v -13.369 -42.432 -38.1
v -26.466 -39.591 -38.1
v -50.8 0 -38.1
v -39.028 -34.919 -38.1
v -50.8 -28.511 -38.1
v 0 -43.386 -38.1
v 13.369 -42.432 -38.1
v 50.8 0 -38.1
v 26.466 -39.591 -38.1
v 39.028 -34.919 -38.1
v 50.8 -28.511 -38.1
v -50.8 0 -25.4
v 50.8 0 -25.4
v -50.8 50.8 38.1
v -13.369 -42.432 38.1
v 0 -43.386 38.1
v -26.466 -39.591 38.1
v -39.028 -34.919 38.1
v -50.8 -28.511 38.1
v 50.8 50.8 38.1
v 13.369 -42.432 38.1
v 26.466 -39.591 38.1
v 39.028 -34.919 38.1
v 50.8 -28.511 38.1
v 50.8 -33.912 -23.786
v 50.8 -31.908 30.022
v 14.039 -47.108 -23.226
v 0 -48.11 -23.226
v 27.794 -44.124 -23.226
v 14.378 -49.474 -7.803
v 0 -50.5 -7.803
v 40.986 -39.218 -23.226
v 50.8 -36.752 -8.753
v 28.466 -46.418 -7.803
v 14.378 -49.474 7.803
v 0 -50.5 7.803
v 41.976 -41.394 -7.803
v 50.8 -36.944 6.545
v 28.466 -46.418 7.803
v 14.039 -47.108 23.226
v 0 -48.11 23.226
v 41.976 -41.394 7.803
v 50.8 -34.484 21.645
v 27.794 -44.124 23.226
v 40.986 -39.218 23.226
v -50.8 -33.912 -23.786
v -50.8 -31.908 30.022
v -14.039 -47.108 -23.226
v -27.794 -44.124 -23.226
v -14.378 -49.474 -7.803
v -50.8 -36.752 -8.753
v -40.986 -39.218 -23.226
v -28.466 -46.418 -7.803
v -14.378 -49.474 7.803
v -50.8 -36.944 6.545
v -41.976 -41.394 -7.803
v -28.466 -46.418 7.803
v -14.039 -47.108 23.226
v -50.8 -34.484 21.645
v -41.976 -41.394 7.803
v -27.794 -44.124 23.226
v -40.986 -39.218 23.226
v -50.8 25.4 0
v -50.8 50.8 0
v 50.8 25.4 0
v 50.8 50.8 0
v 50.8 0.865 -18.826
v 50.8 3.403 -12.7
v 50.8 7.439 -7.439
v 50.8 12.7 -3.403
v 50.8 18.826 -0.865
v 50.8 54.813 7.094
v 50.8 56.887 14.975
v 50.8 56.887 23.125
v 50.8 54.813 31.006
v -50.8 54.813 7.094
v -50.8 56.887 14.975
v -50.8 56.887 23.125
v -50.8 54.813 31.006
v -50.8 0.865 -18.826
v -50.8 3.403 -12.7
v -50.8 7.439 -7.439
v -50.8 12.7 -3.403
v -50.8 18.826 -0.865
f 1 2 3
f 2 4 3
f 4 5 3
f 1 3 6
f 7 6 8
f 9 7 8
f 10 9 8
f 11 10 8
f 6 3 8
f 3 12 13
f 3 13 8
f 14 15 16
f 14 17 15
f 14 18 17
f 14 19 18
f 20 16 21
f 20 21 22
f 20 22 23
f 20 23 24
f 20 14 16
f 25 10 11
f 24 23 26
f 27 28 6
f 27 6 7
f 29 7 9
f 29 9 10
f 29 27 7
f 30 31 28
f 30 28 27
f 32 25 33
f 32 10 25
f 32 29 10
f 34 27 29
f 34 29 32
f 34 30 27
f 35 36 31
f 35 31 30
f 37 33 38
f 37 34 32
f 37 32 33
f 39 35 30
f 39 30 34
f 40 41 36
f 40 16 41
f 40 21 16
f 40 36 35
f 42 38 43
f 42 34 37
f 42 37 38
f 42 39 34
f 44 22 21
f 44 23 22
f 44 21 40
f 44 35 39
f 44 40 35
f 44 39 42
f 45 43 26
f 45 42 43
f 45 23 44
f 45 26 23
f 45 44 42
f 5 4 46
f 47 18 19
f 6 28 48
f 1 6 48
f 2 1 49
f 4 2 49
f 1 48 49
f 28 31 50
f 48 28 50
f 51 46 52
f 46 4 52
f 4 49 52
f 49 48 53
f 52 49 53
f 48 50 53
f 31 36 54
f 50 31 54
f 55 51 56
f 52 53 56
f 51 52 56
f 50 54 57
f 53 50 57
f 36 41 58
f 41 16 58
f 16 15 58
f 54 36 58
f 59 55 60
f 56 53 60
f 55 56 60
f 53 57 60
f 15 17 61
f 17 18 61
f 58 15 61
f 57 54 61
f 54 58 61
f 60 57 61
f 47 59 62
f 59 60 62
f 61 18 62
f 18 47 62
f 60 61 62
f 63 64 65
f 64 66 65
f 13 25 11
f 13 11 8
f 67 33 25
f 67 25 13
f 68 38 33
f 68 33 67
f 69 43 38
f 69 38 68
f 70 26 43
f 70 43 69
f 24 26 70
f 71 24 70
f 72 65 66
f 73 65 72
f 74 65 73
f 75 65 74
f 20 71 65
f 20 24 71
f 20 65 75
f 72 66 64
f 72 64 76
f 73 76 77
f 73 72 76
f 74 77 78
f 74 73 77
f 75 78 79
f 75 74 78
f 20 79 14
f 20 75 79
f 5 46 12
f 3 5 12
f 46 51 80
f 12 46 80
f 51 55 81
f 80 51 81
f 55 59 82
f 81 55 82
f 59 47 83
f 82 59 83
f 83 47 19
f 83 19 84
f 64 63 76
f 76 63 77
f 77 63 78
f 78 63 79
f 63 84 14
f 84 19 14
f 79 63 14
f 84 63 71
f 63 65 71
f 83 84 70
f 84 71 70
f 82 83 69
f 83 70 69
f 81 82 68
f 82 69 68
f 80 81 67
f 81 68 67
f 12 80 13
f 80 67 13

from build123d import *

# Parameters (mm, degrees)
F0_W     = 101.6
F0_H     = 101.6
F1_DEPTH = 38.1
F4_DEPTH = 50.8
F5_ANGLE = 70
F6_DEPTH = 50.8


with BuildPart() as f1:
    # F0 (on Top) → F1 (new body, symmetric)
    with BuildSketch(Plane.XY):
        Rectangle(F0_W, F0_H)
    extrude(amount=F1_DEPTH, both=True)

    # F3 (on Right) → F4 (cut, symmetric)
    with BuildSketch(Plane.YZ):
        with BuildLine():
            Line((0, -25.4), (0, -38.1))
            Line((0, -38.1), (50.8, -38.1))
            Line((50.8, -38.1), (50.8, 0))
            Line((50.8, 0), (25.4, 0))
            ThreePointArc((25.4, 0), (7.439488, -7.439488), (0, -25.4))
        make_face()
    extrude(amount=F4_DEPTH, both=True, mode=Mode.SUBTRACT)

    # F3 (on Right) → F5 (revolve, symmetric, cut)
    with BuildSketch(Plane.YZ) as f5_sk:
        with BuildLine():
            ThreePointArc((-43.385721, -38.1), (-50.8, 0), (-43.385721, 38.1))
            Line((-43.385721, 38.1), (-68.785721, 38.1))
            Line((-68.785721, 38.1), (-68.785721, -38.1))
            Line((-68.785721, -38.1), (-43.385721, -38.1))
        make_face()
    revolve(axis=Axis((0, 50.8, 0), (0, 0, -1)), revolution_arc=F5_ANGLE / 2, mode=Mode.SUBTRACT)
    revolve(f5_sk.sketch, axis=Axis((0, 50.8, 0), (0, 0, 1)), revolution_arc=F5_ANGLE / 2, mode=Mode.SUBTRACT)

    # F3 (on Right) → F6 (join, symmetric)
    with BuildSketch(Plane.YZ):
        with BuildLine():
            Line((50.8, 38.1), (50.8, 0))
            ThreePointArc((50.8, 0), (57.15, 19.05), (50.8, 38.1))
        make_face()
    extrude(amount=F6_DEPTH, both=True)


solid = f1.part
